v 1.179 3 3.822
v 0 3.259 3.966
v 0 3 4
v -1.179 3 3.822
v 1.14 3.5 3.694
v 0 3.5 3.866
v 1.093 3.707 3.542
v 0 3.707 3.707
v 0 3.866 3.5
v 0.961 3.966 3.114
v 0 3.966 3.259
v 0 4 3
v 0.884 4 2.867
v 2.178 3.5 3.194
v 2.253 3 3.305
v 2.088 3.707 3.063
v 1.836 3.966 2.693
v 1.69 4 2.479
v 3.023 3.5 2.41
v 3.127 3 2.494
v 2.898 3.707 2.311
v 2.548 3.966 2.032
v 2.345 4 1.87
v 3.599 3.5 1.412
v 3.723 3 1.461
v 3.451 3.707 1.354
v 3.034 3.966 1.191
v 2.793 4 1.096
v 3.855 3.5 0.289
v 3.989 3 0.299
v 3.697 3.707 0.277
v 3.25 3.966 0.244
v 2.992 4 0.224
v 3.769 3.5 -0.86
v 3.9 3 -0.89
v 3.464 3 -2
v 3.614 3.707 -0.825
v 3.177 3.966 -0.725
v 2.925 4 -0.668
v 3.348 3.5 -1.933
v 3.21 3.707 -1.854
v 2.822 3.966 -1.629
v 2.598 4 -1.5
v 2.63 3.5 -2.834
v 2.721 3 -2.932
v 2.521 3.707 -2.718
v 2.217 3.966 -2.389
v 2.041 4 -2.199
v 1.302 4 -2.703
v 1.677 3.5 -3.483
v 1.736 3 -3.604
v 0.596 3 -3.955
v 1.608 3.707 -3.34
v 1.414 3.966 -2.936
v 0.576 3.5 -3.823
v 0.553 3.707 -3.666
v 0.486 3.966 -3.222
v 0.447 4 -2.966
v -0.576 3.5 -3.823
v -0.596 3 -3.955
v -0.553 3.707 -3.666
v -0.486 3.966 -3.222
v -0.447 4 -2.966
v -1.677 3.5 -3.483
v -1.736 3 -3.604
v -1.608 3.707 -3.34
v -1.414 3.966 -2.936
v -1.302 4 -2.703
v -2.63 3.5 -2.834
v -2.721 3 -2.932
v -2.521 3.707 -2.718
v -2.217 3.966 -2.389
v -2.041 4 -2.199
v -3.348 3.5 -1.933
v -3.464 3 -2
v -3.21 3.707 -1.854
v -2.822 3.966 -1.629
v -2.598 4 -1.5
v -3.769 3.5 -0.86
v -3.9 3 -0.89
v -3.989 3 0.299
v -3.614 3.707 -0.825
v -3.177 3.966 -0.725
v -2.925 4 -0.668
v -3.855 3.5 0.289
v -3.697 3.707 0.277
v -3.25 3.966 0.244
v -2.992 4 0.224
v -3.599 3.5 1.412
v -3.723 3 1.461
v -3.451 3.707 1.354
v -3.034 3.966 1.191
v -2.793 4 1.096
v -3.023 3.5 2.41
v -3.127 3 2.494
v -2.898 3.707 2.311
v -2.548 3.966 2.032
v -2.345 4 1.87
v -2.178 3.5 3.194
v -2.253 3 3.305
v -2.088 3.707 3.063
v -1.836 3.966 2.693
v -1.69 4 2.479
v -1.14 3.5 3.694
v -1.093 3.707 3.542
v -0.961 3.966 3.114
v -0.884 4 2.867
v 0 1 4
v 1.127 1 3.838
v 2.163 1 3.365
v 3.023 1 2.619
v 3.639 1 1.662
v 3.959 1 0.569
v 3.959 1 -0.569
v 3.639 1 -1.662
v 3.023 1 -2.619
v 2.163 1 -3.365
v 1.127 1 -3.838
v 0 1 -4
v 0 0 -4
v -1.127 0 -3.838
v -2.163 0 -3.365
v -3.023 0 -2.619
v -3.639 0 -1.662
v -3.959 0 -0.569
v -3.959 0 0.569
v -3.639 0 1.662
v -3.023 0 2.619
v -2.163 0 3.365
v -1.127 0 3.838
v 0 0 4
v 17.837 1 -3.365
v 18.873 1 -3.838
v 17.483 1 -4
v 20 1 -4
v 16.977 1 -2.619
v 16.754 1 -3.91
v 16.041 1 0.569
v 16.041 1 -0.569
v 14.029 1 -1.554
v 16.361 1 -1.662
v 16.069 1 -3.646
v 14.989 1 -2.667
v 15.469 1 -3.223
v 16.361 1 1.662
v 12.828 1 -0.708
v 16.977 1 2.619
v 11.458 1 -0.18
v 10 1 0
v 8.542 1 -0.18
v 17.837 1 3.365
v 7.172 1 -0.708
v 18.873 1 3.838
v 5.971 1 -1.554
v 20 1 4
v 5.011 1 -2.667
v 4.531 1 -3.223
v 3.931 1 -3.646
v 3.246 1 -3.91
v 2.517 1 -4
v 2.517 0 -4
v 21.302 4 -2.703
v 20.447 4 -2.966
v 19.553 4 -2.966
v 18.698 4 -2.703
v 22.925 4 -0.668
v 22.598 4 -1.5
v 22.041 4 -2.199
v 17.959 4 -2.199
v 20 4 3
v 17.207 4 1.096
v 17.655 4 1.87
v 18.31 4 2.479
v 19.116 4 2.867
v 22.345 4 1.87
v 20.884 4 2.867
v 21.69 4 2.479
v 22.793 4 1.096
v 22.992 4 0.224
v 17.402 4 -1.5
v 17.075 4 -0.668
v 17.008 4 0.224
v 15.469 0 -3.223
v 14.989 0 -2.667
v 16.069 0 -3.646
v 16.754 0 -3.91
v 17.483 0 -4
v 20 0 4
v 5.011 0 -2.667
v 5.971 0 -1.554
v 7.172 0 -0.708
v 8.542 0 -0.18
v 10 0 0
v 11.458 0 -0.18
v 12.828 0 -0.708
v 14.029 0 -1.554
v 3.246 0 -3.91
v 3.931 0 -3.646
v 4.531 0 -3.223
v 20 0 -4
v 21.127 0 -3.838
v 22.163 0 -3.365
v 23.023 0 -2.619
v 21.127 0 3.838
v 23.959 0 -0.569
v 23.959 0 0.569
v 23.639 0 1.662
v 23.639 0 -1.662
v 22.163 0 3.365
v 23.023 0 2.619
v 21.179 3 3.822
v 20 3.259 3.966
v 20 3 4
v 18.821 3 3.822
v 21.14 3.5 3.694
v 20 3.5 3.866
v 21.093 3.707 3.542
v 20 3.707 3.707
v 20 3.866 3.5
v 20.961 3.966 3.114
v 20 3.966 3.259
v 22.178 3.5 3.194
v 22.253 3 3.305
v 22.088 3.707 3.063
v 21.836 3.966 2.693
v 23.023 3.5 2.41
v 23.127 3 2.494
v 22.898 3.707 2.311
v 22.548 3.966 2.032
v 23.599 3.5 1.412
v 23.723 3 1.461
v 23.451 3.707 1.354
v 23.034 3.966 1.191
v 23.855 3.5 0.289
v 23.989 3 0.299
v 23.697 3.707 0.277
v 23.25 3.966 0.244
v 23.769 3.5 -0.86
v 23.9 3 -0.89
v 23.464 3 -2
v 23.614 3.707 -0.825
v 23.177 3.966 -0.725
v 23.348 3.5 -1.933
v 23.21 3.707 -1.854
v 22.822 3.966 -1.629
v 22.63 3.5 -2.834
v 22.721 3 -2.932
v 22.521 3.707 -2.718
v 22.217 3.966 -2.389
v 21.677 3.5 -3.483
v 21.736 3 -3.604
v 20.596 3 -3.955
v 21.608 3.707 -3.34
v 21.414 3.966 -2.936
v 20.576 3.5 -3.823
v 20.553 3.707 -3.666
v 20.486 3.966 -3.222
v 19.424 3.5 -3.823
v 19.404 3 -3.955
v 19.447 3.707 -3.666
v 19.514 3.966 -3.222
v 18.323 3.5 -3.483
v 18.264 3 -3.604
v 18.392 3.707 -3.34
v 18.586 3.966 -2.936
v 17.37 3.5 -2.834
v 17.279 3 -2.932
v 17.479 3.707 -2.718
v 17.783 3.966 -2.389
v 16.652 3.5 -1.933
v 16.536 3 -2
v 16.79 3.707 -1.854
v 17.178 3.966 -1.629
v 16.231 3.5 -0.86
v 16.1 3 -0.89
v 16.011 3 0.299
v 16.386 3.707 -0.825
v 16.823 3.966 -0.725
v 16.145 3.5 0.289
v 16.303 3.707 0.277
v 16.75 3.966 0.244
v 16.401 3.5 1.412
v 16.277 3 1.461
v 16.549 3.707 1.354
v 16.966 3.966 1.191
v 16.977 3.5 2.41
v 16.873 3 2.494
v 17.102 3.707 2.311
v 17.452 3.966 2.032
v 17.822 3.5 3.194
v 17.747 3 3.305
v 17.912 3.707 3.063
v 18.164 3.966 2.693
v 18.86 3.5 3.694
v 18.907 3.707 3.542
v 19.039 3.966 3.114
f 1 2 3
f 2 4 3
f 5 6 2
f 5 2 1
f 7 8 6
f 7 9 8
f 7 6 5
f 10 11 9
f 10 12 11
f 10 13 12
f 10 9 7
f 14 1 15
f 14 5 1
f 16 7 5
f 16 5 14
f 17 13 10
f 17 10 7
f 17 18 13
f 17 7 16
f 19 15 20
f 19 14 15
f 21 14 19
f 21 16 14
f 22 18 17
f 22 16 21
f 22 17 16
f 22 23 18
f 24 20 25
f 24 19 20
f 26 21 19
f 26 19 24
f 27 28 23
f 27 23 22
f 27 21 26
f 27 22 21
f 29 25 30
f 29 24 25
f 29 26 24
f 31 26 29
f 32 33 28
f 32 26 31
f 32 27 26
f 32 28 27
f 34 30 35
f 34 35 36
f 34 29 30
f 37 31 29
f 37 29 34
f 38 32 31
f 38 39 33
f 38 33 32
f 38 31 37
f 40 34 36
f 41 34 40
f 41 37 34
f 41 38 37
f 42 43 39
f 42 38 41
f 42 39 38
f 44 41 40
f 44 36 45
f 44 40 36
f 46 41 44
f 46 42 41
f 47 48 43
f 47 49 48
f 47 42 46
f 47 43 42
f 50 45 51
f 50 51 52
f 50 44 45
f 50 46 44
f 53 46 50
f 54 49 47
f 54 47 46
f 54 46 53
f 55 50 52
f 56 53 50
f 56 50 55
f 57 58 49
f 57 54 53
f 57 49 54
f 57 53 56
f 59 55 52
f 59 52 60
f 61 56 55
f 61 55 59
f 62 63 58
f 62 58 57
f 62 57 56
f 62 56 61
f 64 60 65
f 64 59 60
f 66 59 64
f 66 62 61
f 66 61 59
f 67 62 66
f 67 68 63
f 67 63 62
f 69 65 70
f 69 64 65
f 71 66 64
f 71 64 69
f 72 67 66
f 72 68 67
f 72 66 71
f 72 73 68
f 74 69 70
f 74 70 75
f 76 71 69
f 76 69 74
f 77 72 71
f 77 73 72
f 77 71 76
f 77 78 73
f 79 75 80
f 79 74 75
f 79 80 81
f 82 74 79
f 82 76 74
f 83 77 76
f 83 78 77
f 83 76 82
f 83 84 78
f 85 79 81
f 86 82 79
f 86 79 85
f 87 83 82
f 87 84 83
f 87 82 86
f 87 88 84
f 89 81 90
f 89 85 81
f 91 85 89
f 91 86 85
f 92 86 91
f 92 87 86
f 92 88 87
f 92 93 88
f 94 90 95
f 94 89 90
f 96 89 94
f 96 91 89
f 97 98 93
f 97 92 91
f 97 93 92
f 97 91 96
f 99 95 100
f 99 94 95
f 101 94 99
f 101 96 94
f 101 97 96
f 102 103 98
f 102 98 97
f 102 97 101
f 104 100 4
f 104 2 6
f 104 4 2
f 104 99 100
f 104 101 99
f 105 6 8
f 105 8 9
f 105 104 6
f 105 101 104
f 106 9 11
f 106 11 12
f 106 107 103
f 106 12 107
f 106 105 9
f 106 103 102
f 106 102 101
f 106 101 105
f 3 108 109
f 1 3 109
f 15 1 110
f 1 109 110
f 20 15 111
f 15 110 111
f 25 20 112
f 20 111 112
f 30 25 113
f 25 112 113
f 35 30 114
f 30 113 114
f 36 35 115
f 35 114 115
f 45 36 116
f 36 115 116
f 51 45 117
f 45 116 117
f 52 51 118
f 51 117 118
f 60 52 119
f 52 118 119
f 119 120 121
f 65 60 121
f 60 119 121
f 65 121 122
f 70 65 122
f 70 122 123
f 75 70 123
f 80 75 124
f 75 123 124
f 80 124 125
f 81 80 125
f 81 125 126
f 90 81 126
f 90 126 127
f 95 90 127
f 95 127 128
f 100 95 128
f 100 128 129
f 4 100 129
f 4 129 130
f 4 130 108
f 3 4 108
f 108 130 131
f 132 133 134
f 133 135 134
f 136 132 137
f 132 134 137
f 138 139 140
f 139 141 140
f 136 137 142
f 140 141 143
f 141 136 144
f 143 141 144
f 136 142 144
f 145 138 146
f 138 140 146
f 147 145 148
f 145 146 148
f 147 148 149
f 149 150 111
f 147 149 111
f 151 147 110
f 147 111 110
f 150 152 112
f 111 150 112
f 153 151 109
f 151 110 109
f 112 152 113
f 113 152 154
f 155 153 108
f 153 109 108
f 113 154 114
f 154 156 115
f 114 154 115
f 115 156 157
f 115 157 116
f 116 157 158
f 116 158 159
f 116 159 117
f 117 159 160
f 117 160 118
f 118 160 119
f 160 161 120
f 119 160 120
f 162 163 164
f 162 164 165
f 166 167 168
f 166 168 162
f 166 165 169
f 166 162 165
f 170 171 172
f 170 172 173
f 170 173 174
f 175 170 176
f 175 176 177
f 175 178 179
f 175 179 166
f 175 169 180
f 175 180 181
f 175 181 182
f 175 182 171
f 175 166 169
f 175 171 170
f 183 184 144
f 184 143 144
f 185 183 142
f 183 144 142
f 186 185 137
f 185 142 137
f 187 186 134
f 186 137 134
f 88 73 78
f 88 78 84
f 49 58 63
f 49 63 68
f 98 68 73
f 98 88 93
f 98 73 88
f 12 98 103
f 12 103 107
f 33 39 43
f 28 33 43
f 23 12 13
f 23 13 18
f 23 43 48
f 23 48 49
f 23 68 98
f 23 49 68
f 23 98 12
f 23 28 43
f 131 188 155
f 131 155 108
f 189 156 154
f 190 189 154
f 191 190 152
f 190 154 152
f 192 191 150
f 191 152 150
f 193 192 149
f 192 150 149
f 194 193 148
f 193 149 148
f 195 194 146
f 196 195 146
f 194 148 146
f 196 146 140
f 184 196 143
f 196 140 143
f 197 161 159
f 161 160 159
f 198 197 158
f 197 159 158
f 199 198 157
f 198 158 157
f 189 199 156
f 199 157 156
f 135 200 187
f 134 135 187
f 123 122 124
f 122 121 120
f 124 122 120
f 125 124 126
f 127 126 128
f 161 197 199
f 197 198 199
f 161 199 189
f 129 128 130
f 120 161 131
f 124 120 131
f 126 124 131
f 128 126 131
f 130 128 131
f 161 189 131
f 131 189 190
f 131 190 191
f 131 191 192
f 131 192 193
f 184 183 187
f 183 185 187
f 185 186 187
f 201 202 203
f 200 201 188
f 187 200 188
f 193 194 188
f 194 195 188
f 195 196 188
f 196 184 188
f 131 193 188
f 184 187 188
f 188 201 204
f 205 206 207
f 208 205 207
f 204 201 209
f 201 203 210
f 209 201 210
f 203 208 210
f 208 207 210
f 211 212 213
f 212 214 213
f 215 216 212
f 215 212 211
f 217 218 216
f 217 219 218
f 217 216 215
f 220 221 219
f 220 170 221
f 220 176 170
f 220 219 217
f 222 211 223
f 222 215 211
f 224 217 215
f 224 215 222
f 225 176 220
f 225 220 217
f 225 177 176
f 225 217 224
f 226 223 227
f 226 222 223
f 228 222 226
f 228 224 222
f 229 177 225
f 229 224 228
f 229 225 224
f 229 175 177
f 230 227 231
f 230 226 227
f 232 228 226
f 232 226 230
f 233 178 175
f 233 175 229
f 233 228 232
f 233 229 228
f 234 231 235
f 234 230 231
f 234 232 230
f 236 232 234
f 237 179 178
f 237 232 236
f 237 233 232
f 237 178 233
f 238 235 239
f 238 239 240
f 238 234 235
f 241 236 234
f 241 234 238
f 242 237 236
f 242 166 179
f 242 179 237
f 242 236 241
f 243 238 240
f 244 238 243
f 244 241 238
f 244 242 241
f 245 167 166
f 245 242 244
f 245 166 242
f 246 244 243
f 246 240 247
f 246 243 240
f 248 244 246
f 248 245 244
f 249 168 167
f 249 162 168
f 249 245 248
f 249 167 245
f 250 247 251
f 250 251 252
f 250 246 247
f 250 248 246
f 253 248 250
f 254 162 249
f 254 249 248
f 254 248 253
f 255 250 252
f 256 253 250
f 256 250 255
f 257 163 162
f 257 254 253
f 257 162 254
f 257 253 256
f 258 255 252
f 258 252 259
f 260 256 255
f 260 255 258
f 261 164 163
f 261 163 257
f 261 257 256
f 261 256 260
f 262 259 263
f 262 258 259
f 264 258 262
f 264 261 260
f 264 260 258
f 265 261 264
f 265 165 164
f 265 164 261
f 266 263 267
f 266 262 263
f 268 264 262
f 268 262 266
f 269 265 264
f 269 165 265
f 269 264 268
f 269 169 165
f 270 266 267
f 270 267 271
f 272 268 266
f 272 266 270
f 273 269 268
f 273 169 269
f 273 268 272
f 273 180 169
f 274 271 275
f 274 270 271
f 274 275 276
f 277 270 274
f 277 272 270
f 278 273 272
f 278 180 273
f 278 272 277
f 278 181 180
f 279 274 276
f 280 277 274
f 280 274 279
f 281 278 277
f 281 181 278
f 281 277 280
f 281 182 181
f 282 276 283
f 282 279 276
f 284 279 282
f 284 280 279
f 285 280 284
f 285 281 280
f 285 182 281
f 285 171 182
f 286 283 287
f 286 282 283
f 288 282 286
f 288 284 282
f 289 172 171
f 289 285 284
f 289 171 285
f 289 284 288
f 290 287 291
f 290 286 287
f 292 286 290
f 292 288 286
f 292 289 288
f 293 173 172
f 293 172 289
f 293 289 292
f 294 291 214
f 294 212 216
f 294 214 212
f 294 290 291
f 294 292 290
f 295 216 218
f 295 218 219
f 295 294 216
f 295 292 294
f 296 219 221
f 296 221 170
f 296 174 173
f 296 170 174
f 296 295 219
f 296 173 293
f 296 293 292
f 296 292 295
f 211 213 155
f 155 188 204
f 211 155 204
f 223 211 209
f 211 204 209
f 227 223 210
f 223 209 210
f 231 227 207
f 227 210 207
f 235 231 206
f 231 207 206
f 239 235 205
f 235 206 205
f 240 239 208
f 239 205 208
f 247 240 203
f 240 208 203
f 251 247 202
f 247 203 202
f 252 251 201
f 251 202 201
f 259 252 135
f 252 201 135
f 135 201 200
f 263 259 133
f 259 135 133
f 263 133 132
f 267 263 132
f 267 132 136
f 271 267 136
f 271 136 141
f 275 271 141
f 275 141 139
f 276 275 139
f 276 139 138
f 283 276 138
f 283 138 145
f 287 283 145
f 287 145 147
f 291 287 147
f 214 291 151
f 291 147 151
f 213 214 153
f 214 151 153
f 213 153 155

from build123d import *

# Parameters (mm, degrees)
SKETCH1_R             = 4
BOSS_EXTRUDE1_DEPTH   = 4
BOSS_EXTRUDE1_2_DEPTH = 4
FILLET1_R             = 1
FILLET2_R             = 1
SKETCH2_W             = 20
SKETCH2_H             = 8
BOSS_EXTRUDE2_DEPTH   = 1
SKETCH3_R             = 6
CUT_EXTRUDE1_DEPTH    = 1
FILLET3_R             = 3


with BuildPart() as part:
    # Sketch1 → Boss-Extrude1 (new body)
    with BuildSketch(Plane(origin=(0, 0, 0), x_dir=(1, 0, 0), z_dir=(0, 1, 0))):
        with Locations(Location((0, 0, 0), (0, 0, 270))):
            Circle(SKETCH1_R)
    extrude(amount=BOSS_EXTRUDE1_DEPTH)

    # Fillet1
    fillet1_edges = [part.edges().sort_by_distance(p)[0] for p in [
        (0, 4, -4),
    ]]
    fillet(fillet1_edges, radius=FILLET1_R)



with BuildPart() as body_2:
    # Sketch1 → Boss-Extrude1 2 (new body)
    with BuildSketch(Plane(origin=(0, 0, 0), x_dir=(1, 0, 0), z_dir=(0, 1, 0))):
        with Locations(Location((20, 0, 0), (0, 0, 270))):
            Circle(SKETCH1_R)
    extrude(amount=BOSS_EXTRUDE1_2_DEPTH)

    # Fillet2
    fillet2_edges = [body_2.edges().sort_by_distance(p)[0] for p in [
        (20, 4, -4),
    ]]
    fillet(fillet2_edges, radius=FILLET2_R)


with BuildPart() as part_1:
    add(part.part)

    add(body_2.part)  # Boss-Extrude2 merges body 2
    # Sketch2 → Boss-Extrude2 (add)
    with BuildSketch(Plane(origin=(0, 0, 0), x_dir=(-1, 0, 0), z_dir=(0, -1, 0))):
        with Locations((-10, 0)):
            Rectangle(SKETCH2_W, SKETCH2_H)
    extrude(amount=-BOSS_EXTRUDE2_DEPTH)

    # Sketch3 → Cut-Extrude1 (cut)
    with BuildSketch(Plane(origin=(0, 1, 0), x_dir=(1, 0, 0), z_dir=(0, 1, 0))):
        with Locations((10, 6)):
            Circle(SKETCH3_R)
    extrude(amount=-CUT_EXTRUDE1_DEPTH, mode=Mode.SUBTRACT)

    # Fillet3
    fillet3_edges = [part_1.edges().sort_by_distance(p)[0] for p in [
        (4.343145751, 0.5, -4),
        (15.656854249, 0.5, -4),
    ]]
    fillet(fillet3_edges, radius=FILLET3_R)


solid = part_1.part
